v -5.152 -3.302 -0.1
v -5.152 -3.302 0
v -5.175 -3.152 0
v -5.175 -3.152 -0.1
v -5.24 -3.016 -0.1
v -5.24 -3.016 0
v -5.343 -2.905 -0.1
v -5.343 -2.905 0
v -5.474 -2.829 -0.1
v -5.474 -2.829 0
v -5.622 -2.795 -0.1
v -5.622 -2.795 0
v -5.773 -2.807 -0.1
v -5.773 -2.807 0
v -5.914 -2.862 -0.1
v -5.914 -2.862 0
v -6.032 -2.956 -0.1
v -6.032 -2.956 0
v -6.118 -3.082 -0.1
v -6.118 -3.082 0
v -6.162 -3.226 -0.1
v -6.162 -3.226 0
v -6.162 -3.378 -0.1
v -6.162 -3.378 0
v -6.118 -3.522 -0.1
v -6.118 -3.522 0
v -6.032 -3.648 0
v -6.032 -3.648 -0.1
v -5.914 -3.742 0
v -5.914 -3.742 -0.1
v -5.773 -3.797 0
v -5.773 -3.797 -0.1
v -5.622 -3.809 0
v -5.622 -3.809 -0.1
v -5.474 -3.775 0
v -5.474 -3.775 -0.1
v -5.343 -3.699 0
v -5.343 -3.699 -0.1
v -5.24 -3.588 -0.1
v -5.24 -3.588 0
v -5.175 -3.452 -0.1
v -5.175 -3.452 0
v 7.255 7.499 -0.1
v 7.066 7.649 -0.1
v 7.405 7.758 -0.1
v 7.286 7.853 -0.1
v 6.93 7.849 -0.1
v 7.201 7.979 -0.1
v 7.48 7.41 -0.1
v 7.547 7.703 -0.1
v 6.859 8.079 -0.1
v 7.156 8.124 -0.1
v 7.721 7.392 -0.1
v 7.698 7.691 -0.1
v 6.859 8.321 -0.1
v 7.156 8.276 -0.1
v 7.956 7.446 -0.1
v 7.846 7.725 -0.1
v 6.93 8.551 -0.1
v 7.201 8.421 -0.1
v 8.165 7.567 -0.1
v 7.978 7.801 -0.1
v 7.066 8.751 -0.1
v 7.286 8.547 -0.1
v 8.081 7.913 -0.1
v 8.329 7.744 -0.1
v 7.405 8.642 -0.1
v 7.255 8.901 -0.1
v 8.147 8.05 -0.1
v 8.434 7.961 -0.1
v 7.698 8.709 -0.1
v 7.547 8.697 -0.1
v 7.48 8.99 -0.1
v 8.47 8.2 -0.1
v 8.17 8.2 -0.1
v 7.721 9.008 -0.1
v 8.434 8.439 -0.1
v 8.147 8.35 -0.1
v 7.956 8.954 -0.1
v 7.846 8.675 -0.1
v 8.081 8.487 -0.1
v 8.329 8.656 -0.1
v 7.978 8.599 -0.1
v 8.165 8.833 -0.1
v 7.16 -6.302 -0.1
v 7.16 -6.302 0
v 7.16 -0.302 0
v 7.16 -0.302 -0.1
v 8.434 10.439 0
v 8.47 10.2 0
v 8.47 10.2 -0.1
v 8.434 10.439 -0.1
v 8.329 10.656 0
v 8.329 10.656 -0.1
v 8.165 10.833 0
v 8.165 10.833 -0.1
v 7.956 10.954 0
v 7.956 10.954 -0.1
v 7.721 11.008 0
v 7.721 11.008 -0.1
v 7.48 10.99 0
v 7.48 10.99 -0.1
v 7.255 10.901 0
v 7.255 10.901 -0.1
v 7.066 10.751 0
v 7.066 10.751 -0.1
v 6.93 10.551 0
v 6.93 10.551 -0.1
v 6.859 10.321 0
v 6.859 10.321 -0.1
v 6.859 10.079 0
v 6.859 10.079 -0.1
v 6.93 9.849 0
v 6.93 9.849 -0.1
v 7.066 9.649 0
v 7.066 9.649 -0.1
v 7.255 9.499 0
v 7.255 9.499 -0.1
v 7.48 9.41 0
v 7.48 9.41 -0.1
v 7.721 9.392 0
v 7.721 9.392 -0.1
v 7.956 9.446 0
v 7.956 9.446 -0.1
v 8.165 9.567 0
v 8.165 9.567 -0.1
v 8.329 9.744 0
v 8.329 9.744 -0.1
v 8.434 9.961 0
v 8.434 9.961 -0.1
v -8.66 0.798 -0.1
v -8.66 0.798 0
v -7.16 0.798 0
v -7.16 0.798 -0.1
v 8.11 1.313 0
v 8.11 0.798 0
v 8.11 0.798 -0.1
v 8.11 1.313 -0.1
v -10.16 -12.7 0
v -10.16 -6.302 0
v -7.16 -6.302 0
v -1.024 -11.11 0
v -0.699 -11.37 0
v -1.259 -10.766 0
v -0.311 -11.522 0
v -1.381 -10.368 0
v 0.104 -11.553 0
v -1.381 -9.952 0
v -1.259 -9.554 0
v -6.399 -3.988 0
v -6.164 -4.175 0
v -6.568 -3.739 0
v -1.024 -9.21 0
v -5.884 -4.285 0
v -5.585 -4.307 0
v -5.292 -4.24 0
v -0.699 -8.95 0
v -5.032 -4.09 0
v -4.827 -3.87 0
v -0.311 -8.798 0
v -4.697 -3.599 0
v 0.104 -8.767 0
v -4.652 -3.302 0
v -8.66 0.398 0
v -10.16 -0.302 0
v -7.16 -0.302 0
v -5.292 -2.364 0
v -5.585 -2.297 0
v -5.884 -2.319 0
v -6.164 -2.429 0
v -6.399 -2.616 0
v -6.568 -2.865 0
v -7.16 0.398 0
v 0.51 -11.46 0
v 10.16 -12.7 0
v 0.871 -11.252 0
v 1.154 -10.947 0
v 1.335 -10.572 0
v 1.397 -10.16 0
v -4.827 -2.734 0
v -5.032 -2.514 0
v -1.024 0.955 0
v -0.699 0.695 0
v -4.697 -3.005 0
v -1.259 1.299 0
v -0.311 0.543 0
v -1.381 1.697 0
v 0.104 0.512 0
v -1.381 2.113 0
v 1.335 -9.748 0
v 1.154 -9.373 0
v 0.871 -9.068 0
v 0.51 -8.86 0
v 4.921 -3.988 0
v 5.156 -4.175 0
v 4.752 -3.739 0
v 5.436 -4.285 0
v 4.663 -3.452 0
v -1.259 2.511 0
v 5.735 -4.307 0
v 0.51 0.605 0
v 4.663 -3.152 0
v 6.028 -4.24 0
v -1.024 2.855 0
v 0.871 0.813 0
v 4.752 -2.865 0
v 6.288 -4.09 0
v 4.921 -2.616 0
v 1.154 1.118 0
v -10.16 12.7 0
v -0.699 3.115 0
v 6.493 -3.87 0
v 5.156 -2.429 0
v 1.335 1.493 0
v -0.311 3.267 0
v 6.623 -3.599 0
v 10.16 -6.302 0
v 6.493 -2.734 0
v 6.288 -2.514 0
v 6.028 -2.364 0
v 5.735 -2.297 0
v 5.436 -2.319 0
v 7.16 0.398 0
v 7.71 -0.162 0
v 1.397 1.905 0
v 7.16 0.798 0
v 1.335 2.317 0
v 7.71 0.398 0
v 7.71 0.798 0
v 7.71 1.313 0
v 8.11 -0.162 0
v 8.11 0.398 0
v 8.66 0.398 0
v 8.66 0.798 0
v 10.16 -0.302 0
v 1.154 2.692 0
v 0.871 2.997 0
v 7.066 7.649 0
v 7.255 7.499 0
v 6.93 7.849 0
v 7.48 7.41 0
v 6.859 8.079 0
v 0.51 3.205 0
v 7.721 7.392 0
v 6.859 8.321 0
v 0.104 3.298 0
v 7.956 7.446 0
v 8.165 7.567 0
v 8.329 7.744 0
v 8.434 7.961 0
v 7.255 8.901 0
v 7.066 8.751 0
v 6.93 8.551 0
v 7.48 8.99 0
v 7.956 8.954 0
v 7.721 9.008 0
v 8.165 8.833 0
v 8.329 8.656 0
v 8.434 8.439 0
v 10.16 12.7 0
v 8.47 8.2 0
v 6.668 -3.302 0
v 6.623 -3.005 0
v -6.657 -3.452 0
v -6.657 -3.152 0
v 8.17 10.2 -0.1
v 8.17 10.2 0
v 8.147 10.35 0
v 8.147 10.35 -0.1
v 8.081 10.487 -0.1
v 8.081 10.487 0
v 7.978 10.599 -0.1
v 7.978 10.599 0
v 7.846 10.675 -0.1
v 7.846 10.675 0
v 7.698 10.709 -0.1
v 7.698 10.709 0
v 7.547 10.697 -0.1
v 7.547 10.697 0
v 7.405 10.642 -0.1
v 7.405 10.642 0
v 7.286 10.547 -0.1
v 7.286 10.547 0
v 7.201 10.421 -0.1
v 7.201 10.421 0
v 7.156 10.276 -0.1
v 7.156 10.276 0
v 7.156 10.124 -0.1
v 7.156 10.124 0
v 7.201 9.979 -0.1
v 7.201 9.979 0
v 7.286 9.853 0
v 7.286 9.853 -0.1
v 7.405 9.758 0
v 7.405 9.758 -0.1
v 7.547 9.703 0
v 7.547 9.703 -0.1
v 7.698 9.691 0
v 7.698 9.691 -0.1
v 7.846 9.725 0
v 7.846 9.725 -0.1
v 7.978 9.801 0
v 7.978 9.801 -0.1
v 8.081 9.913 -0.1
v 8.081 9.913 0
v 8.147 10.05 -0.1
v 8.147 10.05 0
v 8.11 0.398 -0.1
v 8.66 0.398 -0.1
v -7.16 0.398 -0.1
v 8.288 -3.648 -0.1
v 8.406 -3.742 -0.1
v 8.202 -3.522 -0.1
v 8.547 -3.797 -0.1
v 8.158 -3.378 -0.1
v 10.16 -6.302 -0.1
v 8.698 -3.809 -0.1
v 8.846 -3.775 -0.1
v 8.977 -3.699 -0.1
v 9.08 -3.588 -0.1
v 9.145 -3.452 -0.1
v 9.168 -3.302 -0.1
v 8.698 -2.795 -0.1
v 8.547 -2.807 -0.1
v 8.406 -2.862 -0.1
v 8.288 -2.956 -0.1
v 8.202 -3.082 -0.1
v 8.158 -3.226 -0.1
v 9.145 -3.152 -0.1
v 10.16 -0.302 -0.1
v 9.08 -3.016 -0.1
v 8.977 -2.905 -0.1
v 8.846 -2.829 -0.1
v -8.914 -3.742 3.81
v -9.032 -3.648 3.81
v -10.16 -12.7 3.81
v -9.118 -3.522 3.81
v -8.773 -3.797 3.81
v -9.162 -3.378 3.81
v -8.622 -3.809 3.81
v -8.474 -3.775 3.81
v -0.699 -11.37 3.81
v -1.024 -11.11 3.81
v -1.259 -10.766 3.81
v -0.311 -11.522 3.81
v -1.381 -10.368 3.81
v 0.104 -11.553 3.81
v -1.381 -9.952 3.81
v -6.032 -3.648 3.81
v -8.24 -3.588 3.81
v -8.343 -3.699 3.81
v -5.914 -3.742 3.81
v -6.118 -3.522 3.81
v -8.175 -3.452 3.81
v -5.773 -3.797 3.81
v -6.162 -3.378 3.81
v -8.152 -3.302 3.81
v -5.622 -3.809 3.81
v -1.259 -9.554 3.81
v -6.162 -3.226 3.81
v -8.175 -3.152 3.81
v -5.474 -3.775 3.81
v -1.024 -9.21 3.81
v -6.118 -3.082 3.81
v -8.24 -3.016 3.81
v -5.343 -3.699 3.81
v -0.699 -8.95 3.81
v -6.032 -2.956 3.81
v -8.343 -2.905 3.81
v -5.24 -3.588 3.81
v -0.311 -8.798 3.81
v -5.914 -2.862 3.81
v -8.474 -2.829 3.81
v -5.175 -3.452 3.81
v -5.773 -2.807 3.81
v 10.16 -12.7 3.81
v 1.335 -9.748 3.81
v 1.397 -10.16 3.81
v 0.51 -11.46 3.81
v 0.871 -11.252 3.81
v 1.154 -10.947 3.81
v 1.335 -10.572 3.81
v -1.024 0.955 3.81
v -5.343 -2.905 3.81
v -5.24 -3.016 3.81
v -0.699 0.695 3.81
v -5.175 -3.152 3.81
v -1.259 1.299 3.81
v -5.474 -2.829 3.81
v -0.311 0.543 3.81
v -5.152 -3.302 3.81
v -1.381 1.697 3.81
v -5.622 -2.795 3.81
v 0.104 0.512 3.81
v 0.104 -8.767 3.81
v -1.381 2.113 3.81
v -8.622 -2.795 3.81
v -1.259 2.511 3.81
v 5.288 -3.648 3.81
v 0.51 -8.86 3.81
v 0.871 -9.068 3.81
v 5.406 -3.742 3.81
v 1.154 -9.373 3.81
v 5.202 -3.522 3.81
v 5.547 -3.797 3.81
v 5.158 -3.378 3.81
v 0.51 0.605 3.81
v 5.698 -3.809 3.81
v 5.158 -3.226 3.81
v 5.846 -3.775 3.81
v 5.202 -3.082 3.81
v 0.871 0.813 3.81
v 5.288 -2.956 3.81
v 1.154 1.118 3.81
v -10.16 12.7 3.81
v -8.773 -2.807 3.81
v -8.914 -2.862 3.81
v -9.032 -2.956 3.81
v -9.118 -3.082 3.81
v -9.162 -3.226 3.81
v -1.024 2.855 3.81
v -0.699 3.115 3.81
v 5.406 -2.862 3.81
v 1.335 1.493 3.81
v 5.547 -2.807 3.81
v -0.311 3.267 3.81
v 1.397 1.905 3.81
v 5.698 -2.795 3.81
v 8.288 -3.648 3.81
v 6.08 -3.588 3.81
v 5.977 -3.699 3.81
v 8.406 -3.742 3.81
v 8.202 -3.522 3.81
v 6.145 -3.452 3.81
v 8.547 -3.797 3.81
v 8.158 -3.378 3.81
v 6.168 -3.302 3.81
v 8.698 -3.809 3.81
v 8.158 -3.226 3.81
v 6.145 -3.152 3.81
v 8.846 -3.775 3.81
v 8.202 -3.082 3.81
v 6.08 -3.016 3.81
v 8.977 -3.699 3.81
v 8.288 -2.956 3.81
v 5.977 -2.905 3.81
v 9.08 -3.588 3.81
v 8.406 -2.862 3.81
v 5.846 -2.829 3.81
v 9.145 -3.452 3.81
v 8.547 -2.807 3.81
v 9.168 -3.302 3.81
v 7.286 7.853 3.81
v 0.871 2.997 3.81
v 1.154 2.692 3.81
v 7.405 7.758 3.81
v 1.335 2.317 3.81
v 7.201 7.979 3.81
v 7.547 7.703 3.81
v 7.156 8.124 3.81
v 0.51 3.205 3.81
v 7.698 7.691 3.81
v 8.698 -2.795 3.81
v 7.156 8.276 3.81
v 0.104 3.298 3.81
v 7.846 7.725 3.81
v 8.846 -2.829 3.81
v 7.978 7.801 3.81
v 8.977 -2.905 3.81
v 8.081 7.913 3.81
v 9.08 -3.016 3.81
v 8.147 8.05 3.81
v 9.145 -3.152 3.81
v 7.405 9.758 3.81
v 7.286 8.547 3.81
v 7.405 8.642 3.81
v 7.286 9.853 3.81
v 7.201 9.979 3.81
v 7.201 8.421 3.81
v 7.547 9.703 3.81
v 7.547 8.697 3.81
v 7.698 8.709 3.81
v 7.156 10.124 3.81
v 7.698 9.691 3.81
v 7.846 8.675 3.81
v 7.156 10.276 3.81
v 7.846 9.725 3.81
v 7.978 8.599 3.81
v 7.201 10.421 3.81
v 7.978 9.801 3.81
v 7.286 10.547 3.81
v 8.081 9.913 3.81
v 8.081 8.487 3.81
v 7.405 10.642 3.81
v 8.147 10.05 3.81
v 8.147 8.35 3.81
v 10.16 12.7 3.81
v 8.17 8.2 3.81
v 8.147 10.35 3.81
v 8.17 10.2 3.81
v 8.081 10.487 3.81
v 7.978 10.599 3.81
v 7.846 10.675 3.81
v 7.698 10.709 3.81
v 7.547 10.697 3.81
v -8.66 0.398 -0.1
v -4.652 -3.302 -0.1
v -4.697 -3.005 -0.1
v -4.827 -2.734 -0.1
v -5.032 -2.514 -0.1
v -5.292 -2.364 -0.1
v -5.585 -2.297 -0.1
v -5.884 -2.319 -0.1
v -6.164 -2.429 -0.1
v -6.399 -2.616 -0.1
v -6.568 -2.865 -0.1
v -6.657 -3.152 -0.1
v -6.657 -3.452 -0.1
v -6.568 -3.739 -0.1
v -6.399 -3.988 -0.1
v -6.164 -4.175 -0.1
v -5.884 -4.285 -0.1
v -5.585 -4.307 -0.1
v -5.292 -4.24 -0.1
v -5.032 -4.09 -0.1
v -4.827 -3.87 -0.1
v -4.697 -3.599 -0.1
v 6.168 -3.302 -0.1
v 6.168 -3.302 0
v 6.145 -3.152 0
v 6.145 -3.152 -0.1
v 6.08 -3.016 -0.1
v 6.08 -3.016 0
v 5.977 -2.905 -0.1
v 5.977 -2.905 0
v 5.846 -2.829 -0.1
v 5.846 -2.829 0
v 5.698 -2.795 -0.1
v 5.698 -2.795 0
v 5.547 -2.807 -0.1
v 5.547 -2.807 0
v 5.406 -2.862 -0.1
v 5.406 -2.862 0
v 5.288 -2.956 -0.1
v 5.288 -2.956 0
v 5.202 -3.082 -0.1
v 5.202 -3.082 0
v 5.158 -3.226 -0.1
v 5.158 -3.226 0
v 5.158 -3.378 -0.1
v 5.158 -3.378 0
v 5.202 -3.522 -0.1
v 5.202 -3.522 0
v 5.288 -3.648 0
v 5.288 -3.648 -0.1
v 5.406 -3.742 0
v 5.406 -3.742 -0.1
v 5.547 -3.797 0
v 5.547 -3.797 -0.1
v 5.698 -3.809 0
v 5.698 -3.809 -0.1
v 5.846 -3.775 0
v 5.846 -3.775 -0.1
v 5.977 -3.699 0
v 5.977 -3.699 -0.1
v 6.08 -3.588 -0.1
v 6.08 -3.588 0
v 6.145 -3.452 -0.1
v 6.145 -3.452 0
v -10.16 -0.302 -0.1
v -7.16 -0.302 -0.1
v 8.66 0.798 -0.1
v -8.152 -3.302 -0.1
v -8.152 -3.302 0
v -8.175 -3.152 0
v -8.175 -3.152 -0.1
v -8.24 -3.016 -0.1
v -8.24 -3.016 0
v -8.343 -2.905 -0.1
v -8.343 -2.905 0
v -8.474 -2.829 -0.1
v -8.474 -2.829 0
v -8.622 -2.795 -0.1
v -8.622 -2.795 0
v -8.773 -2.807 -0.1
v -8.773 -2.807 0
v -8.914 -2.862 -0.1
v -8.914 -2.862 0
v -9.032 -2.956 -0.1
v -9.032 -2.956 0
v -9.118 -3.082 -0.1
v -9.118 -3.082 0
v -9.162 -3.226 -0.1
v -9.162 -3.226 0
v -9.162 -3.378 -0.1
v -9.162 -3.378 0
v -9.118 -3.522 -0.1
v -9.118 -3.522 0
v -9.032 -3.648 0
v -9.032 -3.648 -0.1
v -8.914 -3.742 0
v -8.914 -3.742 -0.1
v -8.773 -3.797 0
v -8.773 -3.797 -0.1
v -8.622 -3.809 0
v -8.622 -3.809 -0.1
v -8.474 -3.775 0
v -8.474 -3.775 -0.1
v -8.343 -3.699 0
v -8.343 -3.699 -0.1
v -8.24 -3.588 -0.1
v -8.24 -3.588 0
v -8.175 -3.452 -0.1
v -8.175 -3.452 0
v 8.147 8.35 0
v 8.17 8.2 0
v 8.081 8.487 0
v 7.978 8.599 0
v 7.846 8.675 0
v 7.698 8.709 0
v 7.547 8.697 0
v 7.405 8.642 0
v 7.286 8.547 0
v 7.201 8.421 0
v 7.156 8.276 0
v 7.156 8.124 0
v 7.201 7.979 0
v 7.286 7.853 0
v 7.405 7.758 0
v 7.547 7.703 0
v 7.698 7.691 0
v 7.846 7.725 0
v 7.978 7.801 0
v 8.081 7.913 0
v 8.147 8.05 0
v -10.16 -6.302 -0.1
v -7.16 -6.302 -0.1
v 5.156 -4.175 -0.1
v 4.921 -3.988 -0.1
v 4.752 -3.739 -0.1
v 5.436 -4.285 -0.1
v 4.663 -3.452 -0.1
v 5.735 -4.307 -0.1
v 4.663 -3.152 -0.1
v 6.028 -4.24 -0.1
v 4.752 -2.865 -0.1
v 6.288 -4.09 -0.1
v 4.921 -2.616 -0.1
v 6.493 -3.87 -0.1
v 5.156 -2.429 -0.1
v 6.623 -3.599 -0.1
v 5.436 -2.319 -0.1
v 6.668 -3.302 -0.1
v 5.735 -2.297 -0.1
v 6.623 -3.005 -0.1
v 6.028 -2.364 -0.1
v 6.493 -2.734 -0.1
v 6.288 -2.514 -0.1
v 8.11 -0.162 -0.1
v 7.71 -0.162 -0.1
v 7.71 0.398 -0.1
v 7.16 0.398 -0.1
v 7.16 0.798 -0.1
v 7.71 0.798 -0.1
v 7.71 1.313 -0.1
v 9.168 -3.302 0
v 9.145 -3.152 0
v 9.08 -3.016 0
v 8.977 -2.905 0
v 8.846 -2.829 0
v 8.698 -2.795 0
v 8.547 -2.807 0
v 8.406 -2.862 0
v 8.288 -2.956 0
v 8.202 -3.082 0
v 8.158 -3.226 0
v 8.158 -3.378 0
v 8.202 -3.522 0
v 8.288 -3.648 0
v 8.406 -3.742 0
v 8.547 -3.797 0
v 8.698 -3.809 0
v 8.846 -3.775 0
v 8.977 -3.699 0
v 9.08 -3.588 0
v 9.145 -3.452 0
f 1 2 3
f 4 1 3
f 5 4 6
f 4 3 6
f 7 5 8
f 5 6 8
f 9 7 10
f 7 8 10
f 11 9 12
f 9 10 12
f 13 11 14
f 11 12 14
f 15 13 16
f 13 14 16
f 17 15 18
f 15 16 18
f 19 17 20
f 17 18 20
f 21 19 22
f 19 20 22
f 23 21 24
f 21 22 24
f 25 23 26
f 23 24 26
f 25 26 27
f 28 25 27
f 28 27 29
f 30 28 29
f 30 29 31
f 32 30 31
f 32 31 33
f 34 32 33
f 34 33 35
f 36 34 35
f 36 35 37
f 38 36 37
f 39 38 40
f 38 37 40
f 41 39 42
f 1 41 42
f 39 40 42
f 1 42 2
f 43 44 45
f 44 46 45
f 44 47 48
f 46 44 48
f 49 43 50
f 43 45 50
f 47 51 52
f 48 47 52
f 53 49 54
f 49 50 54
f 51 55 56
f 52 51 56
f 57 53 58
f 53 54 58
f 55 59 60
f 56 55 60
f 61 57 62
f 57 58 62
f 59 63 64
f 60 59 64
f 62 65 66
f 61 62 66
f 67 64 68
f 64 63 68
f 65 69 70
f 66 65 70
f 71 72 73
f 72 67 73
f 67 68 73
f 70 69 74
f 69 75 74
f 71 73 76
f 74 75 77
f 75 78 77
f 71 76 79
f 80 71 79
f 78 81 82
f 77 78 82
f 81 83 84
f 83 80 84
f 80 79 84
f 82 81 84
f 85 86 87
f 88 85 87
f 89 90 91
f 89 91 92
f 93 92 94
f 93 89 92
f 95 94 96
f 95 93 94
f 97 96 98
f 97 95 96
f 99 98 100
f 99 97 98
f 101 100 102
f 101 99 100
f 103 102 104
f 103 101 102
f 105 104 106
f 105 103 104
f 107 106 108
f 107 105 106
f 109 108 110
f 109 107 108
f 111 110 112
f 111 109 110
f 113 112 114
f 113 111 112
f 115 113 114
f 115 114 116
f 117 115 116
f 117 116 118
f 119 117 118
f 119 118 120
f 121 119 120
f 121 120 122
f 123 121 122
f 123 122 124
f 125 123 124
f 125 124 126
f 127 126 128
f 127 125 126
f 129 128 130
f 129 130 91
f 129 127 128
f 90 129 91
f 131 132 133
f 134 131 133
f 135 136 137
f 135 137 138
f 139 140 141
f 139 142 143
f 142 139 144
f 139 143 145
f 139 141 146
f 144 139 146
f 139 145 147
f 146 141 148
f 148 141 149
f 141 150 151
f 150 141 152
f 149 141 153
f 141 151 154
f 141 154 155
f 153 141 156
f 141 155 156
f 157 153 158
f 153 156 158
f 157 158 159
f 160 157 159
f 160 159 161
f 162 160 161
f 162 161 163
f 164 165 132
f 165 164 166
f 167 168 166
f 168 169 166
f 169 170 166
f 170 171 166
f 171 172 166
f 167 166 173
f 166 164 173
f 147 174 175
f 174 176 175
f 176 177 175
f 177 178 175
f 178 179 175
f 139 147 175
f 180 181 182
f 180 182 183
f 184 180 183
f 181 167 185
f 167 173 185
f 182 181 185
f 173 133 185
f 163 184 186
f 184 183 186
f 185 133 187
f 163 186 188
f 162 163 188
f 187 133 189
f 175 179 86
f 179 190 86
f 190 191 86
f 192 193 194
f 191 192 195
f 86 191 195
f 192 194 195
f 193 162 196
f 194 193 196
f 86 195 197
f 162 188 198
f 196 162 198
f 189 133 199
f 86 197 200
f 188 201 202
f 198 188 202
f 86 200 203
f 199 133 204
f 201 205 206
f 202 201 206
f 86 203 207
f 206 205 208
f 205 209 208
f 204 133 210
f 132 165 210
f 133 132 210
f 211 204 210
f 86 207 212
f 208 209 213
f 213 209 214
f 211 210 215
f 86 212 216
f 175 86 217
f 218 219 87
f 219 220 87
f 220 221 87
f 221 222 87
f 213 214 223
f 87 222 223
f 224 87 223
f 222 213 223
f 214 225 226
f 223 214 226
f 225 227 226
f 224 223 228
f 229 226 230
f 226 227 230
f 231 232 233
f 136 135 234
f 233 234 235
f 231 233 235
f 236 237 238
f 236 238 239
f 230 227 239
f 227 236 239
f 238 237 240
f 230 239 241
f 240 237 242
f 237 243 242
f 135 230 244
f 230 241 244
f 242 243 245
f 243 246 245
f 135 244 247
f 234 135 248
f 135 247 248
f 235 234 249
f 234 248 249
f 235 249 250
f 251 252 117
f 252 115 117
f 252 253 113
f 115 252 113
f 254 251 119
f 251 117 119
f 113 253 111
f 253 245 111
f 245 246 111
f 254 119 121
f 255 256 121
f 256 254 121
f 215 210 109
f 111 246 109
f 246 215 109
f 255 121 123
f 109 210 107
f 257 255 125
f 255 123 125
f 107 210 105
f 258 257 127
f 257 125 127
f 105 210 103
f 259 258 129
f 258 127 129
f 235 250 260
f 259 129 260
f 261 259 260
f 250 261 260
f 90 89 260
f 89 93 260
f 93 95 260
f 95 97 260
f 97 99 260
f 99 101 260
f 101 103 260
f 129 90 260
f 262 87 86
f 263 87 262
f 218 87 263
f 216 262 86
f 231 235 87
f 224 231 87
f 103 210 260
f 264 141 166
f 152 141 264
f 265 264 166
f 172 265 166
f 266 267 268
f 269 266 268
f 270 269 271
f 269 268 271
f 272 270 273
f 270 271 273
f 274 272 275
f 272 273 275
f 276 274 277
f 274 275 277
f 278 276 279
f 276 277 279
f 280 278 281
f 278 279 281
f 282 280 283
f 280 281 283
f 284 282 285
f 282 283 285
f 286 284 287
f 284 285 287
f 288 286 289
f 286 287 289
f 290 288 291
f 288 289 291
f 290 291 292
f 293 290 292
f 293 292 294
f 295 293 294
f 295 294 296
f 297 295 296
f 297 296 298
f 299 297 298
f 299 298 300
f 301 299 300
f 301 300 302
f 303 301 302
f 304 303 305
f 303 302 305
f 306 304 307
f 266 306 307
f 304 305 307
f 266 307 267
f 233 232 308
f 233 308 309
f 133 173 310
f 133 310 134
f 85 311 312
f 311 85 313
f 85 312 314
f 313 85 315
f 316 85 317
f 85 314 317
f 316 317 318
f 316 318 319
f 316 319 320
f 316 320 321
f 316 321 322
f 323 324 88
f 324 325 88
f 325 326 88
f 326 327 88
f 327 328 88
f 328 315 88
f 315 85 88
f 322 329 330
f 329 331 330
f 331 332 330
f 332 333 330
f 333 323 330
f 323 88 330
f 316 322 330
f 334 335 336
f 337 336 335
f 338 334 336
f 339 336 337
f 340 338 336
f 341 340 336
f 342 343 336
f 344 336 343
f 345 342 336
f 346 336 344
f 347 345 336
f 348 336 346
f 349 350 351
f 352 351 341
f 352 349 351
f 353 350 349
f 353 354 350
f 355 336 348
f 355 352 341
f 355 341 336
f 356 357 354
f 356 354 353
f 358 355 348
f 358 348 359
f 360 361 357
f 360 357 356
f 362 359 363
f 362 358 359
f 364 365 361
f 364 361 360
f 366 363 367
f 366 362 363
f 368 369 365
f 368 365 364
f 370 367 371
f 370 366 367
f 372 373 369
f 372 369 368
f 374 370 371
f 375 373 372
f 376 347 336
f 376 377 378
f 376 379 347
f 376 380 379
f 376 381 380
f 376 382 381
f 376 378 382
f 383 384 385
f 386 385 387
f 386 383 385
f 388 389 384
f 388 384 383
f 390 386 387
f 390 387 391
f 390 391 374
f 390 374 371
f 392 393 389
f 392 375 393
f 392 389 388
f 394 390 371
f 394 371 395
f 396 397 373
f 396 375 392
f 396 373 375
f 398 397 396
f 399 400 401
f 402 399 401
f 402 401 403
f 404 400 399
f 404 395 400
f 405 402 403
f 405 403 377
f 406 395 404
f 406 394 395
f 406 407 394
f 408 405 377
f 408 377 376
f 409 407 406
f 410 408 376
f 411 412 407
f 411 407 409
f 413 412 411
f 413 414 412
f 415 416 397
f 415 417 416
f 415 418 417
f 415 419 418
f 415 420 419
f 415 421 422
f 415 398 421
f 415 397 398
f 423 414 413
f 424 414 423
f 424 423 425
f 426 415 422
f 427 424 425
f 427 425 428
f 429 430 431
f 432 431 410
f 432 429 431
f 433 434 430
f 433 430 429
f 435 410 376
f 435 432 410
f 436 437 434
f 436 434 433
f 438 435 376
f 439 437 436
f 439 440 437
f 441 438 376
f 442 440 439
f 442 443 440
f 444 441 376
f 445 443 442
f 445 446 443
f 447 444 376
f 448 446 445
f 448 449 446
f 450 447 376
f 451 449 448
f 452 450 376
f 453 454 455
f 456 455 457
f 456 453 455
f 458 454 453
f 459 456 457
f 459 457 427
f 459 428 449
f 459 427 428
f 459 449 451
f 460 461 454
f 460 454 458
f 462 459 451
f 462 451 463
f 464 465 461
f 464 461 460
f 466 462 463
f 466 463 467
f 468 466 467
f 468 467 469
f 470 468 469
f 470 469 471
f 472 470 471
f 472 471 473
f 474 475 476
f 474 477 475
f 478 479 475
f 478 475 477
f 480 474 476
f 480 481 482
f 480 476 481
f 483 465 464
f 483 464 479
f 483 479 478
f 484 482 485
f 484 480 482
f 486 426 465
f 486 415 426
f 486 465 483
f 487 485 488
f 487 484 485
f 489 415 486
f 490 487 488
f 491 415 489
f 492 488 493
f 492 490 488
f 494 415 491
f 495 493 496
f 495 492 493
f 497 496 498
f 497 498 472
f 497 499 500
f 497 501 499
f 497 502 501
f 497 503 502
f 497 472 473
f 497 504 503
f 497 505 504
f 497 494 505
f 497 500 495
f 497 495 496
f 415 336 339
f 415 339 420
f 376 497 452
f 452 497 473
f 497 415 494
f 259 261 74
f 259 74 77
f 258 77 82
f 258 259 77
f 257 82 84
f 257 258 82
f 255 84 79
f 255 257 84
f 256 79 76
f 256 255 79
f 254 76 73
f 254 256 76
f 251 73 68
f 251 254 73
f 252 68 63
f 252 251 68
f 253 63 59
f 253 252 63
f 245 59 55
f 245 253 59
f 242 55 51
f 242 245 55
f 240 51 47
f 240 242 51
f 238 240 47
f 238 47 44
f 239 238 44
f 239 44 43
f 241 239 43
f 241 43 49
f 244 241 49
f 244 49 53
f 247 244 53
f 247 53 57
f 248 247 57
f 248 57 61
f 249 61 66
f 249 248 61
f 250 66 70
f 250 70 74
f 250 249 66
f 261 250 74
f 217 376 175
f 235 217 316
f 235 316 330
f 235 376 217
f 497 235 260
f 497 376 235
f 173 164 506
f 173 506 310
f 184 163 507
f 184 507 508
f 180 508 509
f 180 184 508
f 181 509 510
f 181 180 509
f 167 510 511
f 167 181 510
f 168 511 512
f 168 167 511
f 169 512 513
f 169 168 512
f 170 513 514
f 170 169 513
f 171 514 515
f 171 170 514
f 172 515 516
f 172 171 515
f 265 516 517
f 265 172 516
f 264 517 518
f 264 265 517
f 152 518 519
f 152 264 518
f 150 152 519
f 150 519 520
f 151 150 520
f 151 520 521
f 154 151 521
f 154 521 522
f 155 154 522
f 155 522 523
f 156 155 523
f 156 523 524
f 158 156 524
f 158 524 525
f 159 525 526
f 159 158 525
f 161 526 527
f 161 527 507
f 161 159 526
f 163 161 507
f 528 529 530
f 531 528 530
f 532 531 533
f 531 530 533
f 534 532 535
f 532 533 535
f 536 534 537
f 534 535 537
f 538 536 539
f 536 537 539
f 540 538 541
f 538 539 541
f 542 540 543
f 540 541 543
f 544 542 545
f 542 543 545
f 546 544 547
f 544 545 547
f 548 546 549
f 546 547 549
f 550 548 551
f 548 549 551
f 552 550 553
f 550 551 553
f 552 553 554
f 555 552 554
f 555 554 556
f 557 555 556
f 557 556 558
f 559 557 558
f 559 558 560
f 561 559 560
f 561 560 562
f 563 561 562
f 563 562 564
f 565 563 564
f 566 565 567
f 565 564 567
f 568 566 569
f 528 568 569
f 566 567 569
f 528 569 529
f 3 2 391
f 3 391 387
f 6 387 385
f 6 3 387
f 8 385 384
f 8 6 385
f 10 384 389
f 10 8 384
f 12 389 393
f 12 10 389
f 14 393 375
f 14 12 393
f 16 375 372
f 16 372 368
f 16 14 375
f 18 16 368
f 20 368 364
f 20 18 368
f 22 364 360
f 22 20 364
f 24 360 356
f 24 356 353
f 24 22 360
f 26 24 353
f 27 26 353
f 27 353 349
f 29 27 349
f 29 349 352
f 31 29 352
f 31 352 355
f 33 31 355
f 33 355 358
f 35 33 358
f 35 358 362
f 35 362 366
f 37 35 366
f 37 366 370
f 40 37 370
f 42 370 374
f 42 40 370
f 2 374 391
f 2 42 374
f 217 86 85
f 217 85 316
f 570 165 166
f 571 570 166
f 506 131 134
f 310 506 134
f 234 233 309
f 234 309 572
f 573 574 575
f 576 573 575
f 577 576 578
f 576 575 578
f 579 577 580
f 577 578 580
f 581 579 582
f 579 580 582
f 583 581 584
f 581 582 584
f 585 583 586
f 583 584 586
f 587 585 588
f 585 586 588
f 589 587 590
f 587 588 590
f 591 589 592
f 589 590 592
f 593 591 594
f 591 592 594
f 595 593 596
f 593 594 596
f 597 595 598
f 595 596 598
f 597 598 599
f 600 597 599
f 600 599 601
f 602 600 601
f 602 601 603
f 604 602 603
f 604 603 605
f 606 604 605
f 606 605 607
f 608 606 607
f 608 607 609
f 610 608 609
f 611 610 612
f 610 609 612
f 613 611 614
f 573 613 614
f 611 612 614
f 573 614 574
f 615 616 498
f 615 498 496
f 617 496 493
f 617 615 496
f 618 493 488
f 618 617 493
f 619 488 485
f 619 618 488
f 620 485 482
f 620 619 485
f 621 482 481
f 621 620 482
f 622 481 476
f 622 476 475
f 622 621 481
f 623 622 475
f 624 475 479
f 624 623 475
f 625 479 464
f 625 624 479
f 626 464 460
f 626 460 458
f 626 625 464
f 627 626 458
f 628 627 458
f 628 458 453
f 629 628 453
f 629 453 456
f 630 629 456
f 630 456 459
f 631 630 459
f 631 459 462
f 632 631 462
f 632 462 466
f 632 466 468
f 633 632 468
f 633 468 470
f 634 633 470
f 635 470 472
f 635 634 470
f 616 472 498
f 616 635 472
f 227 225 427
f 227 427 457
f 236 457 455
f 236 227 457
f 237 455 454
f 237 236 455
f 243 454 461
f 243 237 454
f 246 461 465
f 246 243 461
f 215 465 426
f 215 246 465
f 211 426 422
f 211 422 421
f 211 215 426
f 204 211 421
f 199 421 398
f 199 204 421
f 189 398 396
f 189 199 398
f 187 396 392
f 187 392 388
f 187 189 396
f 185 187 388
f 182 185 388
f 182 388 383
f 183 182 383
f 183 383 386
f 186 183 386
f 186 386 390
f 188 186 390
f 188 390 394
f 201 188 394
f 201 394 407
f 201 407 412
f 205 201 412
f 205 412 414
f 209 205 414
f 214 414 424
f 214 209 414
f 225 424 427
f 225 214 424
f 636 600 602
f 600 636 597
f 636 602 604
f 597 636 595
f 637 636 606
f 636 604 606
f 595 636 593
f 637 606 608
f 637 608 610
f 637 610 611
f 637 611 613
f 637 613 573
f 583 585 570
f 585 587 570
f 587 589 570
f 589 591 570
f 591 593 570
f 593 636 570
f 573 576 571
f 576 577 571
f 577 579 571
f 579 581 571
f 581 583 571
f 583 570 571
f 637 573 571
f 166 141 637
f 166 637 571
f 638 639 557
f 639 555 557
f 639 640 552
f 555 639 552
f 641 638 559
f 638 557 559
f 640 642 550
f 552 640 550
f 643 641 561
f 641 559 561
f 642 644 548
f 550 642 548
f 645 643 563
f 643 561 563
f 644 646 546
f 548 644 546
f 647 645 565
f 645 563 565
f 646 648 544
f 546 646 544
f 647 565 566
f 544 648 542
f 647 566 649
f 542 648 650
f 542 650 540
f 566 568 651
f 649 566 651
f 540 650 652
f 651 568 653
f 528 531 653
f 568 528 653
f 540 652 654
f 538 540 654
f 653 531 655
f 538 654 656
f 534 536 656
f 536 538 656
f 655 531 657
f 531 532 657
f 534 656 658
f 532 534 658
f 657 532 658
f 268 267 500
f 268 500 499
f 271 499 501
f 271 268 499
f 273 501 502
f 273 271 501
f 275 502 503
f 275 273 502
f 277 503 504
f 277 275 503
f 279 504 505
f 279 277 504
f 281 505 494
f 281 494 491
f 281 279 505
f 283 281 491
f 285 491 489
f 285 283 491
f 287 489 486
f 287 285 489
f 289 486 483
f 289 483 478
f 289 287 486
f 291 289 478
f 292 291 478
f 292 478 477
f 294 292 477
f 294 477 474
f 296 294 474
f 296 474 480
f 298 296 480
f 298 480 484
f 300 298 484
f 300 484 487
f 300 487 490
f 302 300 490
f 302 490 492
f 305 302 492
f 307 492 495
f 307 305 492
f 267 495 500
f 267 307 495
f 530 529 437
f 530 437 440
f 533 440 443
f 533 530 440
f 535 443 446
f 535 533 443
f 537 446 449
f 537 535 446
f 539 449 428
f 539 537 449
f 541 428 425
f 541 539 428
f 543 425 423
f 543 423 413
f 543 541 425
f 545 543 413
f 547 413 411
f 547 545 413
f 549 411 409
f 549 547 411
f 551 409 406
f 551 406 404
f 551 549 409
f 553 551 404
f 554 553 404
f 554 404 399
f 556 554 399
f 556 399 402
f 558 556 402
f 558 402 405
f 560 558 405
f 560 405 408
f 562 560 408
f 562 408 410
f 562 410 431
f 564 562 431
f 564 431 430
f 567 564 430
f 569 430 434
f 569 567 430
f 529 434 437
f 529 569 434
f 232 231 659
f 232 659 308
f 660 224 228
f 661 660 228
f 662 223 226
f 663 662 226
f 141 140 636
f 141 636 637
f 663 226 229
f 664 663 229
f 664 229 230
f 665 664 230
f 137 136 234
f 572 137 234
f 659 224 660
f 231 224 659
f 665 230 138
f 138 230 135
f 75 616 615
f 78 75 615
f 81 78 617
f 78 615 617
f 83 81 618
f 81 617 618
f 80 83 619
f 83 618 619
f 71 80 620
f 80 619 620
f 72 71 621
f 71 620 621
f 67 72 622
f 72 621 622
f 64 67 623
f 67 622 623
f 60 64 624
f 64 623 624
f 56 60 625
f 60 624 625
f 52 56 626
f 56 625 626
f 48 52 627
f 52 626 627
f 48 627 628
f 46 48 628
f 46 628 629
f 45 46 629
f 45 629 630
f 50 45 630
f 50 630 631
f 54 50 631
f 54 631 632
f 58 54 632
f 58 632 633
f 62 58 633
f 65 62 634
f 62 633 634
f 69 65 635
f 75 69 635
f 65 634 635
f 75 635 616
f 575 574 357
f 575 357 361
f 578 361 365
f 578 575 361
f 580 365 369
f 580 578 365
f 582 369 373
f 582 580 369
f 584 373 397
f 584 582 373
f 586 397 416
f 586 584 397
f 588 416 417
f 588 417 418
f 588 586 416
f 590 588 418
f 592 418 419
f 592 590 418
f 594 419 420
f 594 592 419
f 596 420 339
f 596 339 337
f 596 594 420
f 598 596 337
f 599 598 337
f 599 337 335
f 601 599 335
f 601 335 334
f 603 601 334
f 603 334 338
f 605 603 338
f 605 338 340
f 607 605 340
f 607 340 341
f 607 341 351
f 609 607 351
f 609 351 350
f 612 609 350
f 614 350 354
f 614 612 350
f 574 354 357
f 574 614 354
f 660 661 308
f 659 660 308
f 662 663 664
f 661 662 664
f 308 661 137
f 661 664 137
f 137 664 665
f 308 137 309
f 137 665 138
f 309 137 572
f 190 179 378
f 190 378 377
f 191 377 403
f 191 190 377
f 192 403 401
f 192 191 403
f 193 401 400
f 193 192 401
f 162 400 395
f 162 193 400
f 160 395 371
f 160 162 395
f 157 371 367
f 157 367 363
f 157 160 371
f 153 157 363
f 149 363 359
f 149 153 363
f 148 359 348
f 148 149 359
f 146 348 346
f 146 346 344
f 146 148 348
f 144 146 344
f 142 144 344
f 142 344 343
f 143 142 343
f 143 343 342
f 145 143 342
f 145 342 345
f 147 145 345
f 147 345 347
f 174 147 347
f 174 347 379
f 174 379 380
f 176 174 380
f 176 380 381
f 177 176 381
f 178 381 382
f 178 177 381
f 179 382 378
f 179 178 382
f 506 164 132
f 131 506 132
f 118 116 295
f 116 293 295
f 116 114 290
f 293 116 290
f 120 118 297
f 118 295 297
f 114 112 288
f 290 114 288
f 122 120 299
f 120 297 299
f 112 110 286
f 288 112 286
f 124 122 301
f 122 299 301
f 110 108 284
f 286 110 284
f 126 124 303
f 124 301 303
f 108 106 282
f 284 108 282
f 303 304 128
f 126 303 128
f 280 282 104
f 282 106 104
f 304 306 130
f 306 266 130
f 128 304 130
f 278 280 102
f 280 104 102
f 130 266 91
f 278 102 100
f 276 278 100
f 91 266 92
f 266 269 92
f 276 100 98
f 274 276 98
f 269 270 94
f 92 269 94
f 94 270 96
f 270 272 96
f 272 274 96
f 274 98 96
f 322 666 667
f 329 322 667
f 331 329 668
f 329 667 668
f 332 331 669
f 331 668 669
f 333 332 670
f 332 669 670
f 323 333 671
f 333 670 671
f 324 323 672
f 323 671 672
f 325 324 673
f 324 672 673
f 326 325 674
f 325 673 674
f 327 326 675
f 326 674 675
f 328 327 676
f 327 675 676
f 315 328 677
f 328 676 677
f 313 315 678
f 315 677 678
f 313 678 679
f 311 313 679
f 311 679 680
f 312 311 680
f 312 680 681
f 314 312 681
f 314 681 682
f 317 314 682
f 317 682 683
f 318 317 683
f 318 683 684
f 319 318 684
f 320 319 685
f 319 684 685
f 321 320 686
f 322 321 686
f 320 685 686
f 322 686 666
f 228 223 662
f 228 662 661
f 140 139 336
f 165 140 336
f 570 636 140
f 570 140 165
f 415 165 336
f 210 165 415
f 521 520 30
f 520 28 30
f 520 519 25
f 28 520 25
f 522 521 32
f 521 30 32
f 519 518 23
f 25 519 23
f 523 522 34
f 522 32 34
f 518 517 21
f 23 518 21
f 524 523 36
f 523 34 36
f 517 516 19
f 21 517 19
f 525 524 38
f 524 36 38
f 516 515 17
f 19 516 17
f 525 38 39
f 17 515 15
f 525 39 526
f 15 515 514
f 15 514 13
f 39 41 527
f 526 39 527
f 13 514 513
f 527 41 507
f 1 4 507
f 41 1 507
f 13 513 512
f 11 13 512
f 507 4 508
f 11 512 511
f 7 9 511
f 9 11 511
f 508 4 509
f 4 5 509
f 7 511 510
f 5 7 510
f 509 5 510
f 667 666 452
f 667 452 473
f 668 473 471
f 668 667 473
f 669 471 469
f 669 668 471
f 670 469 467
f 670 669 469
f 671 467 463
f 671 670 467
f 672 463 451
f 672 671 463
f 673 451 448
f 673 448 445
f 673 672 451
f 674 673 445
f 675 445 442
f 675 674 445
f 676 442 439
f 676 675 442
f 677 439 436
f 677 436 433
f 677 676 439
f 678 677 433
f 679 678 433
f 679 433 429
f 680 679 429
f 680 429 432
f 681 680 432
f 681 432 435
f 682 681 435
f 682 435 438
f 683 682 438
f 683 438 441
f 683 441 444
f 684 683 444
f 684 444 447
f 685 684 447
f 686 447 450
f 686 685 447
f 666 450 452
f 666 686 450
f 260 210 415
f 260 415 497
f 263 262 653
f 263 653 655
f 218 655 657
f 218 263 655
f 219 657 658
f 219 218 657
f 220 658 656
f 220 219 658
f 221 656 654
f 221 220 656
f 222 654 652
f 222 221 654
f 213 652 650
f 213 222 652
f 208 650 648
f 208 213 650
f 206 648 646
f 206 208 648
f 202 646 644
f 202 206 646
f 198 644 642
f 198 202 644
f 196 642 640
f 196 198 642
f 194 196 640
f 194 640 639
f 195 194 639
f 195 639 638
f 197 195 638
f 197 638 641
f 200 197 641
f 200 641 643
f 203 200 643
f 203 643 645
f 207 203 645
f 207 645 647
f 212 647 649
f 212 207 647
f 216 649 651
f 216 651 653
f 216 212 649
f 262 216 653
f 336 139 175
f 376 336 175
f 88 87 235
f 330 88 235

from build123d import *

# Parameters (mm, degrees)
SKETCH1_W         = 20.32
SKETCH1_H         = 25.4
SKETCH1_R         = 1.397
SKETCH1_R_2       = 0.508
SKETCH1_R_3       = 0.51
BOARD_DEPTH       = 3.81
SKETCH2_W         = 3
SKETCH2_H         = 6
SKETCH2_R         = 0.508
SKETCH2_R_2       = 1.008
SKETCH2_R_3       = 0.81
SKETCH2_R_4       = 0.51
SKETCH2_W_2       = 1.5
SKETCH2_H_2       = 0.4
SKETCH2_W_3       = 0.4
SKETCH2_H_3       = 1.475523652
SOLDER_PADS_DEPTH = 0.1


with BuildPart() as part:
    # Sketch1 → Board (new body)
    with BuildSketch(Plane.XY):
        Rectangle(SKETCH1_W, SKETCH1_H)
        with Locations((0, -10.16)):
            Circle(SKETCH1_R, mode=Mode.SUBTRACT)
        with Locations((0, 1.905)):
            Circle(SKETCH1_R, mode=Mode.SUBTRACT)
        with Locations((-8.66, -3.302)):
            Circle(SKETCH1_R_2, mode=Mode.SUBTRACT)
        with Locations((8.66, -3.302)):
            Circle(SKETCH1_R_2, mode=Mode.SUBTRACT)
        with Locations((-5.66, -3.302)):
            Circle(SKETCH1_R_2, mode=Mode.SUBTRACT)
        with Locations((5.66, -3.302)):
            Circle(SKETCH1_R_2, mode=Mode.SUBTRACT)
        with Locations((7.66, 10.2)):
            Circle(SKETCH1_R_3, mode=Mode.SUBTRACT)
        with Locations((7.66, 8.2)):
            Circle(SKETCH1_R_3, mode=Mode.SUBTRACT)
    extrude(amount=BOARD_DEPTH)

    # Sketch2 → Solder Pads (add)
    with BuildSketch(Plane.XY):
        with Locations((8.66, -3.302)):
            Rectangle(SKETCH2_W, SKETCH2_H)
        with Locations((8.66, -3.302)):
            Circle(SKETCH2_R, mode=Mode.SUBTRACT)
        with Locations((-8.66, -3.302)):
            Rectangle(SKETCH2_W, SKETCH2_H)
        with Locations((-8.66, -3.302)):
            Circle(SKETCH2_R, mode=Mode.SUBTRACT)
        with Locations((5.66, -3.302)):
            Circle(SKETCH2_R_2)
        with Locations((5.66, -3.302)):
            Circle(SKETCH2_R, mode=Mode.SUBTRACT)
        with Locations((-5.66, -3.302)):
            Circle(SKETCH2_R_2)
        with Locations((-5.66, -3.302)):
            Circle(SKETCH2_R, mode=Mode.SUBTRACT)
        with Locations((7.66, 8.2)):
            Circle(SKETCH2_R_3)
        with Locations((7.66, 8.2)):
            Circle(SKETCH2_R_4, mode=Mode.SUBTRACT)
        with Locations((7.66, 10.2)):
            Circle(SKETCH2_R_3)
        with Locations((7.66, 10.2)):
            Circle(SKETCH2_R_4, mode=Mode.SUBTRACT)
        with Locations((7.91, 0.598)):
            Rectangle(SKETCH2_W_2, SKETCH2_H_2)
        with Locations((7.91, 0.575572986)):
            Rectangle(SKETCH2_W_3, SKETCH2_H_3)
        with Locations((-7.91, 0.598)):
            Rectangle(SKETCH2_W_2, SKETCH2_H_2)
    extrude(amount=-SOLDER_PADS_DEPTH)


solid = part.part
